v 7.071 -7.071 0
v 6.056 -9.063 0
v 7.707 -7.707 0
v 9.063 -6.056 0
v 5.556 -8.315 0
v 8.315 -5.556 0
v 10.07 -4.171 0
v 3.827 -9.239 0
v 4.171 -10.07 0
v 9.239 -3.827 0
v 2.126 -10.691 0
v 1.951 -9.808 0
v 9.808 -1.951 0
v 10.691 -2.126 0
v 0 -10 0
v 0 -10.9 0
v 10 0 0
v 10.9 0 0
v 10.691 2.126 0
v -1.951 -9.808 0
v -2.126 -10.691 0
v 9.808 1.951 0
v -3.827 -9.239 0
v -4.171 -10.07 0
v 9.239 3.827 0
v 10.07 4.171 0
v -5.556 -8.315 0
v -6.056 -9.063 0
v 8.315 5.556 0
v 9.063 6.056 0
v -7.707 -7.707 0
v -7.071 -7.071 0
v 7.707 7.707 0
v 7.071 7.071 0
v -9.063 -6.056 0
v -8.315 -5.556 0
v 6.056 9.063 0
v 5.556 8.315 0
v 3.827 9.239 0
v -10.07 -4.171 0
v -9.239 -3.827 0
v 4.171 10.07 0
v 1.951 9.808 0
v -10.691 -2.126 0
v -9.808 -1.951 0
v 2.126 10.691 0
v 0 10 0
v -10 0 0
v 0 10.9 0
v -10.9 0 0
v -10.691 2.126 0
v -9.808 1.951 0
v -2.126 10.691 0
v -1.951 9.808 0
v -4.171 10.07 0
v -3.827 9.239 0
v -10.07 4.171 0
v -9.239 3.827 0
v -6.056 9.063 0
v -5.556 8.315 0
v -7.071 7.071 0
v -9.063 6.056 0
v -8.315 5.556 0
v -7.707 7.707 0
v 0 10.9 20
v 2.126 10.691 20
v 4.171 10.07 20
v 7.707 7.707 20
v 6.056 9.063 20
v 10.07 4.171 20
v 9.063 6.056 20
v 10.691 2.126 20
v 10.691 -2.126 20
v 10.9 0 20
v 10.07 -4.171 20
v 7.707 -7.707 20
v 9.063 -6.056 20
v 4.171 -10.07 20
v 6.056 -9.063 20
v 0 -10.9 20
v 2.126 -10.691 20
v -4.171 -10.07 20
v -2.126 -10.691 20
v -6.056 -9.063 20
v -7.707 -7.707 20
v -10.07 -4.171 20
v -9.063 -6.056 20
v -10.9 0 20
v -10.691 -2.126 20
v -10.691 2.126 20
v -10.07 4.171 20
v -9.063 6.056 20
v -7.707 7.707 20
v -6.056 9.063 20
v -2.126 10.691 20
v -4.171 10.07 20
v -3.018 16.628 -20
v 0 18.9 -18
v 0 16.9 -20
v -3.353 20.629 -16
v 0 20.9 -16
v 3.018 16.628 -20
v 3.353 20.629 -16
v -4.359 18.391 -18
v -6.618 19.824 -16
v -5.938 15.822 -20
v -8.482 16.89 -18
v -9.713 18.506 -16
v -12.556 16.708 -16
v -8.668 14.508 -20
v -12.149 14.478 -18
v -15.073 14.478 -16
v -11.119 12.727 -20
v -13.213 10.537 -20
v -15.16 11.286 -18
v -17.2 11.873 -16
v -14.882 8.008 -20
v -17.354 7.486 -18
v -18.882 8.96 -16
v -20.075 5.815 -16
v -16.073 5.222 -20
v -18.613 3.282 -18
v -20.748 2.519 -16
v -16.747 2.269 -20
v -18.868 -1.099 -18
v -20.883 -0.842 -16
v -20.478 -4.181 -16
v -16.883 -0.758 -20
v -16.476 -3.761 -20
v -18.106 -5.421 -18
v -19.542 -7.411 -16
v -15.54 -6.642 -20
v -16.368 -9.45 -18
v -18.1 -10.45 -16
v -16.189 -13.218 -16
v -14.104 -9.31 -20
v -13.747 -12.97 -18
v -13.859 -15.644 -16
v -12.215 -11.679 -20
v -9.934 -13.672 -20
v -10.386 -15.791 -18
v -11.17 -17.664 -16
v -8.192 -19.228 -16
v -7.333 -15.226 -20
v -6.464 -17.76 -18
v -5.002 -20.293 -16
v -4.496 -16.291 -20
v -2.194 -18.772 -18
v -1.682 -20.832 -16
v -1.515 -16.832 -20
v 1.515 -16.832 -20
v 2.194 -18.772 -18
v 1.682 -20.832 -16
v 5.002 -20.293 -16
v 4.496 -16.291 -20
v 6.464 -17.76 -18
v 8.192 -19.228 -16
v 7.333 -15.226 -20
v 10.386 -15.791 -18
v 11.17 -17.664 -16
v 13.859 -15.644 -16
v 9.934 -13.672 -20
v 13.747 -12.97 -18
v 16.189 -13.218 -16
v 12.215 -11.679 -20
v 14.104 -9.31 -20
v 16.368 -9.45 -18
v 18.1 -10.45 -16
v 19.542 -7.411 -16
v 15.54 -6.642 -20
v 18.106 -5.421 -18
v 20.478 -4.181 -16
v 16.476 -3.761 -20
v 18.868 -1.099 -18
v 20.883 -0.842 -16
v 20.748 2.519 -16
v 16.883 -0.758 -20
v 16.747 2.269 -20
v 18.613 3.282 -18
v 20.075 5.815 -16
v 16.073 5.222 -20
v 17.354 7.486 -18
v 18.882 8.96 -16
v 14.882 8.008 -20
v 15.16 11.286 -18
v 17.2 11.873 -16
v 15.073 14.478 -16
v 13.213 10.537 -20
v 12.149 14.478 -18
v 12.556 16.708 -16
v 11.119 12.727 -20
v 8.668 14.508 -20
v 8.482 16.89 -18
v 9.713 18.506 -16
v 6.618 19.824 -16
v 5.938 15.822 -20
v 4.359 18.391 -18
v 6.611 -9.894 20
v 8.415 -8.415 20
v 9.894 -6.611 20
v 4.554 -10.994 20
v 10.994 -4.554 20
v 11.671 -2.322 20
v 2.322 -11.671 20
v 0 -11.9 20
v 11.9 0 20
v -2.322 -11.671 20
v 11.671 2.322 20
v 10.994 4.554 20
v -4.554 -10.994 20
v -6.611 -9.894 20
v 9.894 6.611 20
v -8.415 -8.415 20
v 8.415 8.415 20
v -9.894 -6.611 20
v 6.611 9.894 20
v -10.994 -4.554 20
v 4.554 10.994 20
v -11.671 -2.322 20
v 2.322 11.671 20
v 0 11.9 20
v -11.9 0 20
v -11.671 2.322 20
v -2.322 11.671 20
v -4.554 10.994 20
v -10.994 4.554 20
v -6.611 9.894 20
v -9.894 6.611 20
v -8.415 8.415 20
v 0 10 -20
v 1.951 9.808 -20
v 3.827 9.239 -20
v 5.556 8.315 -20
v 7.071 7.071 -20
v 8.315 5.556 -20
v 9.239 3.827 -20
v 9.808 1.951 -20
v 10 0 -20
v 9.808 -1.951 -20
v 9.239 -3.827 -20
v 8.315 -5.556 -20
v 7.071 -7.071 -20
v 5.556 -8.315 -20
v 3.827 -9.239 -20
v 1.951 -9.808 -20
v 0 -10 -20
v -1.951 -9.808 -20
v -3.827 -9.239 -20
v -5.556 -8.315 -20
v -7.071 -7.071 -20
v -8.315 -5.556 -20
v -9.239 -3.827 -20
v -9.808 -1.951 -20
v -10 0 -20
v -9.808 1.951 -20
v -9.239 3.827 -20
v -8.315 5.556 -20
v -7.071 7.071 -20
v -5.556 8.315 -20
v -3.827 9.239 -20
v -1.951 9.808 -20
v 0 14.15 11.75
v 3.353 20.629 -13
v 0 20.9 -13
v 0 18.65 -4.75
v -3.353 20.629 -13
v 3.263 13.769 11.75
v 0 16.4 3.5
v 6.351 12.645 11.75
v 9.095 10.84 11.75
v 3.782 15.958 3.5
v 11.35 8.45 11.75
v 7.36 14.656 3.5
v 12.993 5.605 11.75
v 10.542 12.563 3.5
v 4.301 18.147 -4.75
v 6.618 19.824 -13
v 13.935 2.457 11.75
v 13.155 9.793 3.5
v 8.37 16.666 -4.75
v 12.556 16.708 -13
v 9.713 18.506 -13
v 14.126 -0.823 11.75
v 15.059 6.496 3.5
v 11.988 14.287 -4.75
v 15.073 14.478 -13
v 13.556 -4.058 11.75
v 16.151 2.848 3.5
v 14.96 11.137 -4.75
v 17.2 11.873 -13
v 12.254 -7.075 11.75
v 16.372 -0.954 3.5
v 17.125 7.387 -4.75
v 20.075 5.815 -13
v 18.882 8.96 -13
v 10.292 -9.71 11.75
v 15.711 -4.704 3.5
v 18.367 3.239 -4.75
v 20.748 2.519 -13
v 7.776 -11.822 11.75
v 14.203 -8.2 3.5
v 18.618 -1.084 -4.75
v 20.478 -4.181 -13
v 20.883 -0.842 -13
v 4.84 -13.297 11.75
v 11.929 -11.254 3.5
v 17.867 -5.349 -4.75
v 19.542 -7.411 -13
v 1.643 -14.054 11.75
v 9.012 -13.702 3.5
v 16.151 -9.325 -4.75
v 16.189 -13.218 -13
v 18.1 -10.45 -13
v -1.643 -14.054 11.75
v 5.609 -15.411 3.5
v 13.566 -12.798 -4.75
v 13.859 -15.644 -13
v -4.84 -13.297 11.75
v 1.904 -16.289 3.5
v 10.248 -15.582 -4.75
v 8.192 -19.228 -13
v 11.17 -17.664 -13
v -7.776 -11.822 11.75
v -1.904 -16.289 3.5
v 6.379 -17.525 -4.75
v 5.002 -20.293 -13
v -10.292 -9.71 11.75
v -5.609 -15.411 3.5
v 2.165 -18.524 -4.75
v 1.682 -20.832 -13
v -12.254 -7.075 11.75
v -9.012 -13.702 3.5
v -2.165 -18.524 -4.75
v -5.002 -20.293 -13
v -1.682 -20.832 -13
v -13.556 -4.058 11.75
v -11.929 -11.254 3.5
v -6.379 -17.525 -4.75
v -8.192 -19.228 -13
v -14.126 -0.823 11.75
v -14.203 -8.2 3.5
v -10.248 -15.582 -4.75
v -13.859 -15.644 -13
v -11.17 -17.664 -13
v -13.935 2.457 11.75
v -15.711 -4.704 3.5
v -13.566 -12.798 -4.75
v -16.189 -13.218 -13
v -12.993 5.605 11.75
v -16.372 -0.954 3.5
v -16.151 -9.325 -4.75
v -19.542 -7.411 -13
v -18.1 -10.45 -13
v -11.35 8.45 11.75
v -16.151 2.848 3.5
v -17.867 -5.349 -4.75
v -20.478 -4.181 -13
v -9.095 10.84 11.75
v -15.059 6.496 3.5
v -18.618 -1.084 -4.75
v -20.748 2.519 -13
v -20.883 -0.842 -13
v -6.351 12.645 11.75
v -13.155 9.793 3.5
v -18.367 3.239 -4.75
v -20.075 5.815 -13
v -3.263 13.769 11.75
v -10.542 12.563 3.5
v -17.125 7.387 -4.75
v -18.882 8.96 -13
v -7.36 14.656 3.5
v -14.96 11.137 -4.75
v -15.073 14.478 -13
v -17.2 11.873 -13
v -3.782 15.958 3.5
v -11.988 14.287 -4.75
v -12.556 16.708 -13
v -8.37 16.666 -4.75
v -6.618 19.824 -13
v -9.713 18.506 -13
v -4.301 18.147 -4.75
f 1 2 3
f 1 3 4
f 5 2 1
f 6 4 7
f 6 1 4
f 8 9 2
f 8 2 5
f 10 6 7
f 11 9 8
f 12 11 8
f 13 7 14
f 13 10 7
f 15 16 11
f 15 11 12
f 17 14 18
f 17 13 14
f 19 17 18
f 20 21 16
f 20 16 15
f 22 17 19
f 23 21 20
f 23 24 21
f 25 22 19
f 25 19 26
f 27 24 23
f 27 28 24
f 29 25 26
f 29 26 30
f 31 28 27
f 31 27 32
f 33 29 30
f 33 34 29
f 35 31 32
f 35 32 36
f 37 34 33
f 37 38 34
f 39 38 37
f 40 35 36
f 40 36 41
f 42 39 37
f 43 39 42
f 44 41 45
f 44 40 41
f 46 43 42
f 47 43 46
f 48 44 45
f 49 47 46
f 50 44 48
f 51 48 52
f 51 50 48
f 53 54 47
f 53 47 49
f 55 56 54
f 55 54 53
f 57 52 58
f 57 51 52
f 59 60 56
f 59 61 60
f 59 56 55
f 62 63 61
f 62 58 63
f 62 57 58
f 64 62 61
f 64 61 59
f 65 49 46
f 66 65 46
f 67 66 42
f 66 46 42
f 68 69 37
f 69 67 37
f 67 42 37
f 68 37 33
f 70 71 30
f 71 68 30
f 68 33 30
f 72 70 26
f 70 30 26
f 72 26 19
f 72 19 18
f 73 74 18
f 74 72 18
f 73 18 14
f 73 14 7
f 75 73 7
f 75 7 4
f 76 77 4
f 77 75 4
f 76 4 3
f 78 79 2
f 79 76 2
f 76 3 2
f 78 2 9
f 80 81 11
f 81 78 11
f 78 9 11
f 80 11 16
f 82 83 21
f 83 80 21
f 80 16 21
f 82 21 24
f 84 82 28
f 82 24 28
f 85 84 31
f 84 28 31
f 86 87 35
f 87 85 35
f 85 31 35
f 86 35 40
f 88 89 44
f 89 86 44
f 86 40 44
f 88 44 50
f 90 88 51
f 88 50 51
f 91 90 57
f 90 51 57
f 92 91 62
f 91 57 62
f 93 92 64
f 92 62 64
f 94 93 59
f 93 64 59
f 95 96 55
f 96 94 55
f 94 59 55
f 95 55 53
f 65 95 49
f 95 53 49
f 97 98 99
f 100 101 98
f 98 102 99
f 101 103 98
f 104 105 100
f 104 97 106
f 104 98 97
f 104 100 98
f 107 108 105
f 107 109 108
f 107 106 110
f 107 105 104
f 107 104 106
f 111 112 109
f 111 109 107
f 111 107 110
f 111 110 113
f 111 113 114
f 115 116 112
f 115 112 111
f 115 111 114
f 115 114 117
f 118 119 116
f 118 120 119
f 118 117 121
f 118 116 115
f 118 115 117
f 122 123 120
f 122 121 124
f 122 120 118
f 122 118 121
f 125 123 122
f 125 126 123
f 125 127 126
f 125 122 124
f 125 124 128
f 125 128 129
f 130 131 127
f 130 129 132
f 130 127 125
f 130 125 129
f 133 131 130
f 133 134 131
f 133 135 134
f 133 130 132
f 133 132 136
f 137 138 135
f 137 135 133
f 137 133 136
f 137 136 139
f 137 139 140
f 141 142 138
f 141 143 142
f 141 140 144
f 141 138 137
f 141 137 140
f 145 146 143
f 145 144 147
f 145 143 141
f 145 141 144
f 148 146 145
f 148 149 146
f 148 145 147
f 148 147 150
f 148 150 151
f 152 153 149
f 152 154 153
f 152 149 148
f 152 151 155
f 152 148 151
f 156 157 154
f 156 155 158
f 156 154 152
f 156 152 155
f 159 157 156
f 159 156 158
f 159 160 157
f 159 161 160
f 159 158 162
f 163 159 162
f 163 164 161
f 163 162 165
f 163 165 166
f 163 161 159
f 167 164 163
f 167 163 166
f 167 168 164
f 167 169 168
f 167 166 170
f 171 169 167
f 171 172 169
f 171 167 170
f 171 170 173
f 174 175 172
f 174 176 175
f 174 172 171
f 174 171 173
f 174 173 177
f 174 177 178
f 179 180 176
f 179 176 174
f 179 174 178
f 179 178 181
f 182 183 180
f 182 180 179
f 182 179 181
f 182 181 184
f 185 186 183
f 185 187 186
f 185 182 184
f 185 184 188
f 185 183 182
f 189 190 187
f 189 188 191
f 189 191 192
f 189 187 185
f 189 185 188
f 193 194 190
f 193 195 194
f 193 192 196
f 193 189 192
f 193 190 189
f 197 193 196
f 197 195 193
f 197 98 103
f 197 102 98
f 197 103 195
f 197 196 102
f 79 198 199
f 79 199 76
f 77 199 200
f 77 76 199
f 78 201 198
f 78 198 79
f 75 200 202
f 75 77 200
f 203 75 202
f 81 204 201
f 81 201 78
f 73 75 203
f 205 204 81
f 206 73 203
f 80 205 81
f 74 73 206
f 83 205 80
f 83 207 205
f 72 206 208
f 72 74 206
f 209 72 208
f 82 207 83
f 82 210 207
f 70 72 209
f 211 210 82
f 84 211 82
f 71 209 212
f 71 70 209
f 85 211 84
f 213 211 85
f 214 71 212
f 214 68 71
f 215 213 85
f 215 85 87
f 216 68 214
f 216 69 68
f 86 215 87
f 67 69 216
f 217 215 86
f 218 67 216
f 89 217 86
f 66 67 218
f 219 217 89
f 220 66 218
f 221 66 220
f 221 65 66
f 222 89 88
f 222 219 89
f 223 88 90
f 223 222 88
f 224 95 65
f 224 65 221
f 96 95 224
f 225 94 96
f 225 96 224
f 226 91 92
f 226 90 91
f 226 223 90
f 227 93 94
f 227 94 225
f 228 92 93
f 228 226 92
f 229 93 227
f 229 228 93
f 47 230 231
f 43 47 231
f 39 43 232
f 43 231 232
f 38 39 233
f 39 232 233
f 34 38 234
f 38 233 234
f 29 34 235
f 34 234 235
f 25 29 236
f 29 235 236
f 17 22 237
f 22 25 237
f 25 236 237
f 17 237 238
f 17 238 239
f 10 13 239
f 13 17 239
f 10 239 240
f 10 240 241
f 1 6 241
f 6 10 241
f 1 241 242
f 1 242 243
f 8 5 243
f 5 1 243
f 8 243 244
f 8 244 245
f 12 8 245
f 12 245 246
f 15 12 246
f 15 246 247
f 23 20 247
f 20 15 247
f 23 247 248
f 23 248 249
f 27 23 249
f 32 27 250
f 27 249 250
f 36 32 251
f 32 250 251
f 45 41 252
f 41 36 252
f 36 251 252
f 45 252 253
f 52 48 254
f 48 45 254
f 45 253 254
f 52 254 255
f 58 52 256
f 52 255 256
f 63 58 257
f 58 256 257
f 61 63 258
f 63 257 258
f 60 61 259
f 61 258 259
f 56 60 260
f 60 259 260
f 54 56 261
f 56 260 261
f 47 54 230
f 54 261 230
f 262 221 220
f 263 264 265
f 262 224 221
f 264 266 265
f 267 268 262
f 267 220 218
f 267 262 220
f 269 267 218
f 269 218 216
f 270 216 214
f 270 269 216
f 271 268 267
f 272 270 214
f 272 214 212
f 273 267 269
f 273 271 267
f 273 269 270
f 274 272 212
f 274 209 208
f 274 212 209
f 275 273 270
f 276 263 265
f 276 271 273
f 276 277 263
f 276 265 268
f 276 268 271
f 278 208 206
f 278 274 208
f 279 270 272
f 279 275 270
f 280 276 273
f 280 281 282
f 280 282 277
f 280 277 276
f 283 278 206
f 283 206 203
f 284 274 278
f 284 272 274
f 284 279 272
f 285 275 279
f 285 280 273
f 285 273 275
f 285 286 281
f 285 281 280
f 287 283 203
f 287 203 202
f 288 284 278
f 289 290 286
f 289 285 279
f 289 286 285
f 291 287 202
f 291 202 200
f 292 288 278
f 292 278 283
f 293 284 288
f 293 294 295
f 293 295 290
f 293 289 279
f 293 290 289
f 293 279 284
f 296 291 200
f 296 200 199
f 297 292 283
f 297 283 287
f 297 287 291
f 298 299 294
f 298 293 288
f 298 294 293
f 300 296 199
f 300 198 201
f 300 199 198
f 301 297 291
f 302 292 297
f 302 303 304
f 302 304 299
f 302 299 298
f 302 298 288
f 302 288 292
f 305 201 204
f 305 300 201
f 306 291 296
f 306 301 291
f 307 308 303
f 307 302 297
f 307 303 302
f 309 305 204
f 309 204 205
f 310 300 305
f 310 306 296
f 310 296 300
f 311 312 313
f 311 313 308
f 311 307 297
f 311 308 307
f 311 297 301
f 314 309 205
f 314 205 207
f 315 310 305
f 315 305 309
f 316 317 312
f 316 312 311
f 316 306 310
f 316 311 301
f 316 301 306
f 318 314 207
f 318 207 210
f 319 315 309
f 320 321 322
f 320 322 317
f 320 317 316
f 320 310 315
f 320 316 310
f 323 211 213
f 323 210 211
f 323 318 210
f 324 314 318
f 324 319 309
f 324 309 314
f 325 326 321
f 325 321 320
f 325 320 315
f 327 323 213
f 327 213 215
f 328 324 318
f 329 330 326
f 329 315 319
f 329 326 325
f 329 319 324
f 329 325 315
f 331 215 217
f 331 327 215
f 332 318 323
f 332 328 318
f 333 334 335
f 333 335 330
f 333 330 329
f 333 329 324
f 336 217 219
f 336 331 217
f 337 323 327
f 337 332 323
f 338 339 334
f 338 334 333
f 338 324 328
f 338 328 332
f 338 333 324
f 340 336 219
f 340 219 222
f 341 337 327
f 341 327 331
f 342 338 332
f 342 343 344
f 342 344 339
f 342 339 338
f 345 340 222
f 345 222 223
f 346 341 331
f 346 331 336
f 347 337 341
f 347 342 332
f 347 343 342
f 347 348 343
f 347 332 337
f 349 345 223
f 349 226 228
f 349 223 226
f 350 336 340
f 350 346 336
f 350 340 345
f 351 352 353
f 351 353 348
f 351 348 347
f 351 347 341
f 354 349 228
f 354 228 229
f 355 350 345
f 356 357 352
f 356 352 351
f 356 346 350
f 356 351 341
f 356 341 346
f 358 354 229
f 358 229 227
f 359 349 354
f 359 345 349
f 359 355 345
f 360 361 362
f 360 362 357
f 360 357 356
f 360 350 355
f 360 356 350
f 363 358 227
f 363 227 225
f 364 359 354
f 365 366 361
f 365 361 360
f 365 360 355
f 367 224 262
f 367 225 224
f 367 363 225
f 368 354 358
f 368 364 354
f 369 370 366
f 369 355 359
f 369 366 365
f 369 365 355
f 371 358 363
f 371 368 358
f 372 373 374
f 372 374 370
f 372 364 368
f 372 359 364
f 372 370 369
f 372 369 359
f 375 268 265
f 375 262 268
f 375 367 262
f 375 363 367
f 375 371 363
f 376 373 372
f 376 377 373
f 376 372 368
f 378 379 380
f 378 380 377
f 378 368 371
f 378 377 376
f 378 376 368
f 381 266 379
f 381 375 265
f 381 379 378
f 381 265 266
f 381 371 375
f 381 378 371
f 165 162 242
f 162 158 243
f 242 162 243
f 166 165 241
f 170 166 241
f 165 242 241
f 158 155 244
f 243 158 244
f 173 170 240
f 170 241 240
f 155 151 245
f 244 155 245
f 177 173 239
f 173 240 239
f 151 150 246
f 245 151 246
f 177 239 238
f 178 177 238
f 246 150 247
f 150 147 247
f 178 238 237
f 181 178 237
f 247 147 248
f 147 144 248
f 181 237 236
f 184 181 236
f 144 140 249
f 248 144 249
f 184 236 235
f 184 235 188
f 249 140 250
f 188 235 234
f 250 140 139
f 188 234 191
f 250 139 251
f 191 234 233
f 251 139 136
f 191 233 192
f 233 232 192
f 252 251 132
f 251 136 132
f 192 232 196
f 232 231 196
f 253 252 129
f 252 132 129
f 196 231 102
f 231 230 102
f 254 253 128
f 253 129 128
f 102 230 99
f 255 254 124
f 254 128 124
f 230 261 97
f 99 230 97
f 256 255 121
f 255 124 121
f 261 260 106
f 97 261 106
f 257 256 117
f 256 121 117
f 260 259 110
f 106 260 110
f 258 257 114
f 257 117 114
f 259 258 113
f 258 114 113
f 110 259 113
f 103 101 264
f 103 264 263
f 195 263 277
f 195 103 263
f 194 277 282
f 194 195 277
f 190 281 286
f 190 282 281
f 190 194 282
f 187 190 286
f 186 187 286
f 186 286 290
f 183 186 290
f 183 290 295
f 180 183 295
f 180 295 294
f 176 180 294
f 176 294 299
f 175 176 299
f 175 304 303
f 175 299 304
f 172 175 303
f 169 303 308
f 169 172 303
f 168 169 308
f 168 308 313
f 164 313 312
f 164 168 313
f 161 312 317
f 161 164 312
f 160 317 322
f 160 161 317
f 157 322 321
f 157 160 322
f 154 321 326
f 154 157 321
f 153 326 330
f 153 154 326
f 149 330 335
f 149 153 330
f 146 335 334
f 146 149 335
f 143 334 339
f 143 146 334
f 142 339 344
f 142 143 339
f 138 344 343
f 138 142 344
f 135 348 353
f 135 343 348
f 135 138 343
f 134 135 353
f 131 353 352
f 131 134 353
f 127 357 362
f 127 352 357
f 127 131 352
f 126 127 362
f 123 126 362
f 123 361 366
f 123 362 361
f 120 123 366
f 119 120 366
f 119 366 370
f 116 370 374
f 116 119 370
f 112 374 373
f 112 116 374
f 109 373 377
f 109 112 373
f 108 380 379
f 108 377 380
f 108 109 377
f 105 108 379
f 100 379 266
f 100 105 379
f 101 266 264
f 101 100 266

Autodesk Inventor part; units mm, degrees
ref_plane "YZ Plane" through (0, 0, 0) normal (1, 0, 0) x (0, 1, 0)
ref_plane "XZ Plane" through (0, 0, 0) normal (0, 1, 0) x (-1, 0, 0)
ref_plane "XY Plane" through (0, 0, 0) normal (0, 0, 1) x (1, 0, 0)
sketch "スケッチ1" plane through (0, 0, 0) normal (1, 0, 0) x (0, 1, 0)
  line L0 (10.9, 20) -> (10.9, 0)
  line L1 (10.9, 0) -> (10, 0)
  line L2 (10, 0) -> (10, -20)
  line L3 (10, -20) -> (20.9, -20)
  line L4 (0, -28) -> (0, 28) projected
  line L5 (10.9, 20) -> (20.9, 20)
  line L6 (20.9, 20) -> (20.9, -20)
  point P0 (0, 0)
  dimension "d1" = 10
  dimension "d2" = 20
  dimension "d3" = 10.9
  dimension "d14" = 20.9
  dimension "d15" = 20
revolve "回転1" add sketch "スケッチ1" angle 360 about axis through (0, 0, -10) along (0, 0, 1)
thread "ねじ1" size "M20x2" class "6H" standard "ISO Metric profile" full length
chamfer "面取り1" distance 33 distance2 9 1 edges at (0, -20.9, 20) measured on face at (1.6818, 20.8322, -6.6667)
chamfer "面取り2" distance 4 angle 45 1 edges at (0, -20.9, -20)
properties part number "rod390_end_cap" material "ステンレス鋼"
